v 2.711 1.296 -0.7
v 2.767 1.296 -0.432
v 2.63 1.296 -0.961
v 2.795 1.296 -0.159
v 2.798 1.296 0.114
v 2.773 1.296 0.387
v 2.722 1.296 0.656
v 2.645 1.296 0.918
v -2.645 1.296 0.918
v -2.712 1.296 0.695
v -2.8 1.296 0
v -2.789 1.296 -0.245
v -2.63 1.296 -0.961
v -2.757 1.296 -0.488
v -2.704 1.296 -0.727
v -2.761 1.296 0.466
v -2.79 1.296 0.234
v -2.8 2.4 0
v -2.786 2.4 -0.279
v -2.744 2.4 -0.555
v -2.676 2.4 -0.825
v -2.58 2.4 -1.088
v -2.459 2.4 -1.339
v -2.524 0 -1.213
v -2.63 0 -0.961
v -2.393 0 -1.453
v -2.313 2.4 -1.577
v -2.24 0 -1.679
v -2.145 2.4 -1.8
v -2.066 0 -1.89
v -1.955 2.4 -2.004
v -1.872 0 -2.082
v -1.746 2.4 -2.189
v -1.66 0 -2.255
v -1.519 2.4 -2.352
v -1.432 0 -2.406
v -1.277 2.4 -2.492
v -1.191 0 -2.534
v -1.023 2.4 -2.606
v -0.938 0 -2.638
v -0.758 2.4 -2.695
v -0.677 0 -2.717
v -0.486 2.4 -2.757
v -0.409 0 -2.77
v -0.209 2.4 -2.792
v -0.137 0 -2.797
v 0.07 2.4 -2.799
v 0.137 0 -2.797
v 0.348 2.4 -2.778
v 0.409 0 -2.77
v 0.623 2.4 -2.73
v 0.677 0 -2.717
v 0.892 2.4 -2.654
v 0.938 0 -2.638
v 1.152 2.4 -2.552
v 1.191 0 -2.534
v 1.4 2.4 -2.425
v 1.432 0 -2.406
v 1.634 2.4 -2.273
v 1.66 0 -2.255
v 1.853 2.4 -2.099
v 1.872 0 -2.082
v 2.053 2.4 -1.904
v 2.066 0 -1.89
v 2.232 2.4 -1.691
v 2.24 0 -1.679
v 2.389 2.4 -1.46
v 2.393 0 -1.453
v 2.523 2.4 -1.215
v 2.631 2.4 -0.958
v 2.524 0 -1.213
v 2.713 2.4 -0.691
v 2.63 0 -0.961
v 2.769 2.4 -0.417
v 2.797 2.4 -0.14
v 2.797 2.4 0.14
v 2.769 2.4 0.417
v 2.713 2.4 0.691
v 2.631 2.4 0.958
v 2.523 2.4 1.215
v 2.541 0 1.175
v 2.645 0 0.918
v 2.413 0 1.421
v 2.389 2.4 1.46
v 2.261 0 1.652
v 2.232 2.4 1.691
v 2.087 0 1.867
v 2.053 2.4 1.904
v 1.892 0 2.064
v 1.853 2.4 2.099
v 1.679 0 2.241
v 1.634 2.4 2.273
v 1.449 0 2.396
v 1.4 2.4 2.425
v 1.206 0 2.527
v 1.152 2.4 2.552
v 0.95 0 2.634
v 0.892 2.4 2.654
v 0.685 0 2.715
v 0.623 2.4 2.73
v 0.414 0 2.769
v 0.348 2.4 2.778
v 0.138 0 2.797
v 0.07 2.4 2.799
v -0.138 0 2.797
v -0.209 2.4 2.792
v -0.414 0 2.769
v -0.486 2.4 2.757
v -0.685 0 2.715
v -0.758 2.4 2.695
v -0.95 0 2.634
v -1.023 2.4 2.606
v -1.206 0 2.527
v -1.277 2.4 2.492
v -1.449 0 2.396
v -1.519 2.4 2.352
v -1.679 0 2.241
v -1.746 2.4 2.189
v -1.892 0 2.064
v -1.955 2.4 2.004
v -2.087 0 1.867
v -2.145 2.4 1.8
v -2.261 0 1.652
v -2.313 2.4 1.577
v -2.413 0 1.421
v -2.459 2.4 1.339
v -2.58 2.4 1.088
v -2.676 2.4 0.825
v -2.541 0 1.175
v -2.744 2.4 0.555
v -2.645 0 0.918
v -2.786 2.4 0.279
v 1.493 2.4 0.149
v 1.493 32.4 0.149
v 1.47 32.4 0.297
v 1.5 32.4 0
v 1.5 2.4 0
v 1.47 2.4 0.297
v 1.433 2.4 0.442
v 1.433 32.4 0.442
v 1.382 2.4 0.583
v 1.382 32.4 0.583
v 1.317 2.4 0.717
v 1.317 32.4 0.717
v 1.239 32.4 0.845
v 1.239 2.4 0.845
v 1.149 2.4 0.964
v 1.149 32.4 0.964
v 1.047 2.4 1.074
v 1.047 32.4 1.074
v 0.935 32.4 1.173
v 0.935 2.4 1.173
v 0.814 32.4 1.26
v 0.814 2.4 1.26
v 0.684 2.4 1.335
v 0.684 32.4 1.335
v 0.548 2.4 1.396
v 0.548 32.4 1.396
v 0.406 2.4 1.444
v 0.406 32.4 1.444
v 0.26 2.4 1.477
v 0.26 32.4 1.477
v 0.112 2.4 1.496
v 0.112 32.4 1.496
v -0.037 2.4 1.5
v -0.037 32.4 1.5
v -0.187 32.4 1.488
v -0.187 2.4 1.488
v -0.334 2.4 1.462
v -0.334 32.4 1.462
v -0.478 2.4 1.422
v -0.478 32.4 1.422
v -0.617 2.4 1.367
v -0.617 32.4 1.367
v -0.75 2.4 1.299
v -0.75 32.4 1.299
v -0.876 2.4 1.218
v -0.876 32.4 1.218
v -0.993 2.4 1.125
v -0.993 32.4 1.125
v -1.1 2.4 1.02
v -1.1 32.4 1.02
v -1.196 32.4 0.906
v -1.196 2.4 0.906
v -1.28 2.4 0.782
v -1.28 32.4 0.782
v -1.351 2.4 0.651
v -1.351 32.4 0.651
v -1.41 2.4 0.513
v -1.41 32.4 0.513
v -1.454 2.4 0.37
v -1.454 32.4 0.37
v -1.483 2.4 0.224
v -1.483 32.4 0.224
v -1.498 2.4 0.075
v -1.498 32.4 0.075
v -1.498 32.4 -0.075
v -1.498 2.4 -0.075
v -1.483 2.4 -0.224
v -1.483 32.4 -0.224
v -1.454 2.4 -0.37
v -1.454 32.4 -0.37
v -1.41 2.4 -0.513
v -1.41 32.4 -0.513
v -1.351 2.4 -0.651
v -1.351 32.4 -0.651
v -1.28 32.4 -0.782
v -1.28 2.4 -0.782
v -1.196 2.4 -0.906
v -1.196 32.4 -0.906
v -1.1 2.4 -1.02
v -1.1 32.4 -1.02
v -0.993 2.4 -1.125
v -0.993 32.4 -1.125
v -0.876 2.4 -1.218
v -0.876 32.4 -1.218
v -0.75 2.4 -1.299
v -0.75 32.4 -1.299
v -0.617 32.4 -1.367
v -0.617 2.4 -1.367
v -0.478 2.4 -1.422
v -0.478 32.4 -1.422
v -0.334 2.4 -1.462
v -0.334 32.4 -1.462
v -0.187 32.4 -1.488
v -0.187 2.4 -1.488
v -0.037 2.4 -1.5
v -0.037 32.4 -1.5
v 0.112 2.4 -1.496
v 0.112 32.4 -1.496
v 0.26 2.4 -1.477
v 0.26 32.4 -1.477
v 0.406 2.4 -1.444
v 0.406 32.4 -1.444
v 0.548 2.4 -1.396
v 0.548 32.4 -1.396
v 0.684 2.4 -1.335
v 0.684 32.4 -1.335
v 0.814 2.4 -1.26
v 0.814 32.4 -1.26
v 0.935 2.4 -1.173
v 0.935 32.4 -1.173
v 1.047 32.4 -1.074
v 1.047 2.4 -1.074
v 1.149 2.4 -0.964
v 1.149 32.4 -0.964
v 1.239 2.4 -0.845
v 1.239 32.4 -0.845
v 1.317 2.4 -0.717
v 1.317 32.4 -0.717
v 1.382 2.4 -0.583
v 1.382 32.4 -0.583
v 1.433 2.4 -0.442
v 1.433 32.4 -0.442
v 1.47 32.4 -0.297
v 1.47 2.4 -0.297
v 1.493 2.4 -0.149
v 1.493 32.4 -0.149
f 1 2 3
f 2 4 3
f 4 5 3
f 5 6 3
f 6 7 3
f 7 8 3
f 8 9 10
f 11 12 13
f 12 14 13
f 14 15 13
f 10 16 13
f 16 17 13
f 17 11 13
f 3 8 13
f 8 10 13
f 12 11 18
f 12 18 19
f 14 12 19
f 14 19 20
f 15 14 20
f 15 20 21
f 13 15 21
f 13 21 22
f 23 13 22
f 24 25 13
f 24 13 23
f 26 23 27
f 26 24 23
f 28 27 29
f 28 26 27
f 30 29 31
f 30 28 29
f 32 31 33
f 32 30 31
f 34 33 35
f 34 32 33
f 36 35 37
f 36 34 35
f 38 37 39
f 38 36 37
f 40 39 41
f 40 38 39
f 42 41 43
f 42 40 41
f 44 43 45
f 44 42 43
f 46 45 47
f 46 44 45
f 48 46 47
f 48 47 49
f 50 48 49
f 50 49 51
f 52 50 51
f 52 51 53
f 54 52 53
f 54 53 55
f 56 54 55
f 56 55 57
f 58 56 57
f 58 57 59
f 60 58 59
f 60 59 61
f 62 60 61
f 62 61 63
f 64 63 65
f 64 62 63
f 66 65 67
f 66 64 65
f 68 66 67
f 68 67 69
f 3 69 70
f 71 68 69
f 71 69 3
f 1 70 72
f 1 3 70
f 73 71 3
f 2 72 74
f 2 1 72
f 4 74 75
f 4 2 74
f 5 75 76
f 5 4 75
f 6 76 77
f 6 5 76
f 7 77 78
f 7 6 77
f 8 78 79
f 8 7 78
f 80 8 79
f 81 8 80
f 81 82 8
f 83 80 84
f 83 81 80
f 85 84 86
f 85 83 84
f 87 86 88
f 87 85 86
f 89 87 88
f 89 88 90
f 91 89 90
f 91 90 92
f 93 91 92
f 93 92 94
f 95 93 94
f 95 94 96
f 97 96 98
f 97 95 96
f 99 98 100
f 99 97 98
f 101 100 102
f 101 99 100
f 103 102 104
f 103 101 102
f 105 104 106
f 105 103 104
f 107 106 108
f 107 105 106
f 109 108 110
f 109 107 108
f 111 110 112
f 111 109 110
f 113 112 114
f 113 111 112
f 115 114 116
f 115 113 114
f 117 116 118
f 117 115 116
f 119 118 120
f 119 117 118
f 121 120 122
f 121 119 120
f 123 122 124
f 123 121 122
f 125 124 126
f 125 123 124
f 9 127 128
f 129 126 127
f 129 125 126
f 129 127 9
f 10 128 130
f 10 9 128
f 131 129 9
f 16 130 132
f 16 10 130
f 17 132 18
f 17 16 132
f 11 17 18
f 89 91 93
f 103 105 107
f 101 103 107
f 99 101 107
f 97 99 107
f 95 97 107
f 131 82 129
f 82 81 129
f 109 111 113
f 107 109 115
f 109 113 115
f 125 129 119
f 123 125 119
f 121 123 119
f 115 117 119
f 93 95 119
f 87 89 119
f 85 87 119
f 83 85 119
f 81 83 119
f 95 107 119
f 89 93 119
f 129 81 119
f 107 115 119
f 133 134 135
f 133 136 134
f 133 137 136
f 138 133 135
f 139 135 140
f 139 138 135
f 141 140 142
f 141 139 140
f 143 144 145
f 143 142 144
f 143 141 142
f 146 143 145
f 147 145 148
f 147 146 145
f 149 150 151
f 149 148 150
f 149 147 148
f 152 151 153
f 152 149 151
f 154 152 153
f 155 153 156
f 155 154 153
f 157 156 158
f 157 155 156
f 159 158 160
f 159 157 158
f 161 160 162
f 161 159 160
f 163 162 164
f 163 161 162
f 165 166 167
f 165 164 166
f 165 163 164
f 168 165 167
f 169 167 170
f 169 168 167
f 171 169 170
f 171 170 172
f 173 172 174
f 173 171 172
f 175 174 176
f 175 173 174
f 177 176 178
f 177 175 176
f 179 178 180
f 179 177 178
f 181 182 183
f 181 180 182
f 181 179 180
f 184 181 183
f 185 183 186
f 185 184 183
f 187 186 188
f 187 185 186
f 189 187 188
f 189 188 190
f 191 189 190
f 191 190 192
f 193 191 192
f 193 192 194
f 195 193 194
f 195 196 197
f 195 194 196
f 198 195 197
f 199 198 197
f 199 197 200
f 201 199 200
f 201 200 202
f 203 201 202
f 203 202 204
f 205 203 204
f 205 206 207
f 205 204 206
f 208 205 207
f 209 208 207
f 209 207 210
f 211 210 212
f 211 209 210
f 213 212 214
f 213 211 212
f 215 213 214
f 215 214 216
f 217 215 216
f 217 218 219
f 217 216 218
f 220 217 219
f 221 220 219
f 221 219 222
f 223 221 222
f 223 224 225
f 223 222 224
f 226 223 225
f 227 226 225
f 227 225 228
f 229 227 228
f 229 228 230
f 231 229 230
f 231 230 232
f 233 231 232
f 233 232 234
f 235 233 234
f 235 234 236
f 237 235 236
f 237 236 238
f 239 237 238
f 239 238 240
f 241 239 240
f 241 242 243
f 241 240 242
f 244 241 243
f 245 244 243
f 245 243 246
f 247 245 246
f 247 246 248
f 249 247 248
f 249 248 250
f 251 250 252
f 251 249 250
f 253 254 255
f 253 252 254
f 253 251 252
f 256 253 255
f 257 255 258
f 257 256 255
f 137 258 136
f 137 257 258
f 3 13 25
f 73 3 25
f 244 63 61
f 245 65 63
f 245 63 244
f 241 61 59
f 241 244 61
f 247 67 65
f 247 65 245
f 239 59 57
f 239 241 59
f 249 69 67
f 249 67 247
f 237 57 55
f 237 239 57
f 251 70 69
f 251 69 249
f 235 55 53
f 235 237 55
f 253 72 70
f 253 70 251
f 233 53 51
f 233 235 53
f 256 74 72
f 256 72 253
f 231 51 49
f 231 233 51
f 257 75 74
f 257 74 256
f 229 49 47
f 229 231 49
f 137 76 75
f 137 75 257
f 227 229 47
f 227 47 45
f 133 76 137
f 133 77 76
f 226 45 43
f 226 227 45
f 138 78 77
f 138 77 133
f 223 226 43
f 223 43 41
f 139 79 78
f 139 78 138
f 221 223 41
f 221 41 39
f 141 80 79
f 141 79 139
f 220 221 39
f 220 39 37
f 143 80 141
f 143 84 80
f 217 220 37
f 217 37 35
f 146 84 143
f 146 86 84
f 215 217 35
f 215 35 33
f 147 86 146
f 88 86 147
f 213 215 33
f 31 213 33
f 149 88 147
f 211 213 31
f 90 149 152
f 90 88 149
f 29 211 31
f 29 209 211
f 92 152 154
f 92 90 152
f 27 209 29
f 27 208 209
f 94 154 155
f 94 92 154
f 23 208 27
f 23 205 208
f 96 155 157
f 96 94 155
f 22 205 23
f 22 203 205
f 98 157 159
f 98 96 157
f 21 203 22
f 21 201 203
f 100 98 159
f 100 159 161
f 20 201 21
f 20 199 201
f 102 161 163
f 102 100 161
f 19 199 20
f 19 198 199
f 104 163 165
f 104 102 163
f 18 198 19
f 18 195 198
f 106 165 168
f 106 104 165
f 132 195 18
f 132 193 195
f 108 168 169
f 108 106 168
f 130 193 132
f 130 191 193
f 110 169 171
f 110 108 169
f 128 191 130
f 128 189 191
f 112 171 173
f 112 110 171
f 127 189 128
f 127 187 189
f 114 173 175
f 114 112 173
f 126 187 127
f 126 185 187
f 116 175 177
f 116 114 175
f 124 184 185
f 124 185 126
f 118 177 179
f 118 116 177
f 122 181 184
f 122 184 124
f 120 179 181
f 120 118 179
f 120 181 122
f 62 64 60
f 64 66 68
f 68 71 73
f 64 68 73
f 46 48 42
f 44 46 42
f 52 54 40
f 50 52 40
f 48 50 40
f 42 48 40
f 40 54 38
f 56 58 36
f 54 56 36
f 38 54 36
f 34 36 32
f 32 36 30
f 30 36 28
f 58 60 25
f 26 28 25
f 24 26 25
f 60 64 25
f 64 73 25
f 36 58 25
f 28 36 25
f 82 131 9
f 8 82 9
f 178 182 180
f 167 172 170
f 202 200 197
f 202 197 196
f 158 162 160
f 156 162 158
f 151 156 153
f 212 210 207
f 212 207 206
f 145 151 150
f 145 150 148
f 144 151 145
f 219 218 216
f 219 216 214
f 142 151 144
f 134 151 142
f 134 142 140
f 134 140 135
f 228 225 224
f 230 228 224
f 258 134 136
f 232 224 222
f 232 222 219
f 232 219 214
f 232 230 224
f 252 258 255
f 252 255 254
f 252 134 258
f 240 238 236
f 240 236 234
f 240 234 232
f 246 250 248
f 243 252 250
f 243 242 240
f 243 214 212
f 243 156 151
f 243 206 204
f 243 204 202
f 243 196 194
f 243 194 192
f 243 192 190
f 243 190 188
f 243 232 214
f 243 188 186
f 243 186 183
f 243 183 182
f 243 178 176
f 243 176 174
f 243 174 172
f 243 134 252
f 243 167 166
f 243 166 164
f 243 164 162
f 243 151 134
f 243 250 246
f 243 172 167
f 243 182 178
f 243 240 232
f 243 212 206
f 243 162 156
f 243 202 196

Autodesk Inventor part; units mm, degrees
ref_plane "YZ Plane" through (0, 0, 0) normal (1, 0, 0) x (0, 1, 0)
ref_plane "XZ Plane" through (0, 0, 0) normal (0, 1, 0) x (-1, 0, 0)
ref_plane "XY Plane" through (0, 0, 0) normal (0, 0, 1) x (1, 0, 0)
sketch "Esboço1" plane through (0, 0, 0) normal (0, 1, 0) x (-1, 0, 0)
  circle A0 centre (0, 0) radius 2.8
  dimension "d0" = 5.6
extrude "Extrusão1" add sketch "Esboço1" along normal blind 2.4
sketch "Esboço2" plane through (0, 0, 0) normal (1, 0, 0) x (0, 1, 0)
  line L0 (0, 0.9185) -> (1.2961, 0.9185)
  line L1 (1.2961, 0.9185) -> (1.2961, -0.9611)
  line L2 (1.2961, -0.9611) -> (0, -0.9611)
  line L3 (0, -0.9611) -> (0, 0.9185)
  point P0 (0, 0)
extrude "Extrusão2" cut sketch "Esboço2" along normal through all both and the other way through all
sketch "Esboço3" plane through (0, 2.4, 0) normal (0, 1, 0) x (1, 0, 0)
  circle A0 centre (0, 0) radius 2.8 projected
  circle A1 centre (0, 0) radius 1.5
  dimension "d5" = 3
extrude "Extrusão3" add sketch "Esboço3" along normal blind 30 contours A1
thread "Rosca1" size "M3x0.5" class "6g" standard "ANSI Metric M Profile" full length
properties part number "AA-Parafuso-M3-30"
